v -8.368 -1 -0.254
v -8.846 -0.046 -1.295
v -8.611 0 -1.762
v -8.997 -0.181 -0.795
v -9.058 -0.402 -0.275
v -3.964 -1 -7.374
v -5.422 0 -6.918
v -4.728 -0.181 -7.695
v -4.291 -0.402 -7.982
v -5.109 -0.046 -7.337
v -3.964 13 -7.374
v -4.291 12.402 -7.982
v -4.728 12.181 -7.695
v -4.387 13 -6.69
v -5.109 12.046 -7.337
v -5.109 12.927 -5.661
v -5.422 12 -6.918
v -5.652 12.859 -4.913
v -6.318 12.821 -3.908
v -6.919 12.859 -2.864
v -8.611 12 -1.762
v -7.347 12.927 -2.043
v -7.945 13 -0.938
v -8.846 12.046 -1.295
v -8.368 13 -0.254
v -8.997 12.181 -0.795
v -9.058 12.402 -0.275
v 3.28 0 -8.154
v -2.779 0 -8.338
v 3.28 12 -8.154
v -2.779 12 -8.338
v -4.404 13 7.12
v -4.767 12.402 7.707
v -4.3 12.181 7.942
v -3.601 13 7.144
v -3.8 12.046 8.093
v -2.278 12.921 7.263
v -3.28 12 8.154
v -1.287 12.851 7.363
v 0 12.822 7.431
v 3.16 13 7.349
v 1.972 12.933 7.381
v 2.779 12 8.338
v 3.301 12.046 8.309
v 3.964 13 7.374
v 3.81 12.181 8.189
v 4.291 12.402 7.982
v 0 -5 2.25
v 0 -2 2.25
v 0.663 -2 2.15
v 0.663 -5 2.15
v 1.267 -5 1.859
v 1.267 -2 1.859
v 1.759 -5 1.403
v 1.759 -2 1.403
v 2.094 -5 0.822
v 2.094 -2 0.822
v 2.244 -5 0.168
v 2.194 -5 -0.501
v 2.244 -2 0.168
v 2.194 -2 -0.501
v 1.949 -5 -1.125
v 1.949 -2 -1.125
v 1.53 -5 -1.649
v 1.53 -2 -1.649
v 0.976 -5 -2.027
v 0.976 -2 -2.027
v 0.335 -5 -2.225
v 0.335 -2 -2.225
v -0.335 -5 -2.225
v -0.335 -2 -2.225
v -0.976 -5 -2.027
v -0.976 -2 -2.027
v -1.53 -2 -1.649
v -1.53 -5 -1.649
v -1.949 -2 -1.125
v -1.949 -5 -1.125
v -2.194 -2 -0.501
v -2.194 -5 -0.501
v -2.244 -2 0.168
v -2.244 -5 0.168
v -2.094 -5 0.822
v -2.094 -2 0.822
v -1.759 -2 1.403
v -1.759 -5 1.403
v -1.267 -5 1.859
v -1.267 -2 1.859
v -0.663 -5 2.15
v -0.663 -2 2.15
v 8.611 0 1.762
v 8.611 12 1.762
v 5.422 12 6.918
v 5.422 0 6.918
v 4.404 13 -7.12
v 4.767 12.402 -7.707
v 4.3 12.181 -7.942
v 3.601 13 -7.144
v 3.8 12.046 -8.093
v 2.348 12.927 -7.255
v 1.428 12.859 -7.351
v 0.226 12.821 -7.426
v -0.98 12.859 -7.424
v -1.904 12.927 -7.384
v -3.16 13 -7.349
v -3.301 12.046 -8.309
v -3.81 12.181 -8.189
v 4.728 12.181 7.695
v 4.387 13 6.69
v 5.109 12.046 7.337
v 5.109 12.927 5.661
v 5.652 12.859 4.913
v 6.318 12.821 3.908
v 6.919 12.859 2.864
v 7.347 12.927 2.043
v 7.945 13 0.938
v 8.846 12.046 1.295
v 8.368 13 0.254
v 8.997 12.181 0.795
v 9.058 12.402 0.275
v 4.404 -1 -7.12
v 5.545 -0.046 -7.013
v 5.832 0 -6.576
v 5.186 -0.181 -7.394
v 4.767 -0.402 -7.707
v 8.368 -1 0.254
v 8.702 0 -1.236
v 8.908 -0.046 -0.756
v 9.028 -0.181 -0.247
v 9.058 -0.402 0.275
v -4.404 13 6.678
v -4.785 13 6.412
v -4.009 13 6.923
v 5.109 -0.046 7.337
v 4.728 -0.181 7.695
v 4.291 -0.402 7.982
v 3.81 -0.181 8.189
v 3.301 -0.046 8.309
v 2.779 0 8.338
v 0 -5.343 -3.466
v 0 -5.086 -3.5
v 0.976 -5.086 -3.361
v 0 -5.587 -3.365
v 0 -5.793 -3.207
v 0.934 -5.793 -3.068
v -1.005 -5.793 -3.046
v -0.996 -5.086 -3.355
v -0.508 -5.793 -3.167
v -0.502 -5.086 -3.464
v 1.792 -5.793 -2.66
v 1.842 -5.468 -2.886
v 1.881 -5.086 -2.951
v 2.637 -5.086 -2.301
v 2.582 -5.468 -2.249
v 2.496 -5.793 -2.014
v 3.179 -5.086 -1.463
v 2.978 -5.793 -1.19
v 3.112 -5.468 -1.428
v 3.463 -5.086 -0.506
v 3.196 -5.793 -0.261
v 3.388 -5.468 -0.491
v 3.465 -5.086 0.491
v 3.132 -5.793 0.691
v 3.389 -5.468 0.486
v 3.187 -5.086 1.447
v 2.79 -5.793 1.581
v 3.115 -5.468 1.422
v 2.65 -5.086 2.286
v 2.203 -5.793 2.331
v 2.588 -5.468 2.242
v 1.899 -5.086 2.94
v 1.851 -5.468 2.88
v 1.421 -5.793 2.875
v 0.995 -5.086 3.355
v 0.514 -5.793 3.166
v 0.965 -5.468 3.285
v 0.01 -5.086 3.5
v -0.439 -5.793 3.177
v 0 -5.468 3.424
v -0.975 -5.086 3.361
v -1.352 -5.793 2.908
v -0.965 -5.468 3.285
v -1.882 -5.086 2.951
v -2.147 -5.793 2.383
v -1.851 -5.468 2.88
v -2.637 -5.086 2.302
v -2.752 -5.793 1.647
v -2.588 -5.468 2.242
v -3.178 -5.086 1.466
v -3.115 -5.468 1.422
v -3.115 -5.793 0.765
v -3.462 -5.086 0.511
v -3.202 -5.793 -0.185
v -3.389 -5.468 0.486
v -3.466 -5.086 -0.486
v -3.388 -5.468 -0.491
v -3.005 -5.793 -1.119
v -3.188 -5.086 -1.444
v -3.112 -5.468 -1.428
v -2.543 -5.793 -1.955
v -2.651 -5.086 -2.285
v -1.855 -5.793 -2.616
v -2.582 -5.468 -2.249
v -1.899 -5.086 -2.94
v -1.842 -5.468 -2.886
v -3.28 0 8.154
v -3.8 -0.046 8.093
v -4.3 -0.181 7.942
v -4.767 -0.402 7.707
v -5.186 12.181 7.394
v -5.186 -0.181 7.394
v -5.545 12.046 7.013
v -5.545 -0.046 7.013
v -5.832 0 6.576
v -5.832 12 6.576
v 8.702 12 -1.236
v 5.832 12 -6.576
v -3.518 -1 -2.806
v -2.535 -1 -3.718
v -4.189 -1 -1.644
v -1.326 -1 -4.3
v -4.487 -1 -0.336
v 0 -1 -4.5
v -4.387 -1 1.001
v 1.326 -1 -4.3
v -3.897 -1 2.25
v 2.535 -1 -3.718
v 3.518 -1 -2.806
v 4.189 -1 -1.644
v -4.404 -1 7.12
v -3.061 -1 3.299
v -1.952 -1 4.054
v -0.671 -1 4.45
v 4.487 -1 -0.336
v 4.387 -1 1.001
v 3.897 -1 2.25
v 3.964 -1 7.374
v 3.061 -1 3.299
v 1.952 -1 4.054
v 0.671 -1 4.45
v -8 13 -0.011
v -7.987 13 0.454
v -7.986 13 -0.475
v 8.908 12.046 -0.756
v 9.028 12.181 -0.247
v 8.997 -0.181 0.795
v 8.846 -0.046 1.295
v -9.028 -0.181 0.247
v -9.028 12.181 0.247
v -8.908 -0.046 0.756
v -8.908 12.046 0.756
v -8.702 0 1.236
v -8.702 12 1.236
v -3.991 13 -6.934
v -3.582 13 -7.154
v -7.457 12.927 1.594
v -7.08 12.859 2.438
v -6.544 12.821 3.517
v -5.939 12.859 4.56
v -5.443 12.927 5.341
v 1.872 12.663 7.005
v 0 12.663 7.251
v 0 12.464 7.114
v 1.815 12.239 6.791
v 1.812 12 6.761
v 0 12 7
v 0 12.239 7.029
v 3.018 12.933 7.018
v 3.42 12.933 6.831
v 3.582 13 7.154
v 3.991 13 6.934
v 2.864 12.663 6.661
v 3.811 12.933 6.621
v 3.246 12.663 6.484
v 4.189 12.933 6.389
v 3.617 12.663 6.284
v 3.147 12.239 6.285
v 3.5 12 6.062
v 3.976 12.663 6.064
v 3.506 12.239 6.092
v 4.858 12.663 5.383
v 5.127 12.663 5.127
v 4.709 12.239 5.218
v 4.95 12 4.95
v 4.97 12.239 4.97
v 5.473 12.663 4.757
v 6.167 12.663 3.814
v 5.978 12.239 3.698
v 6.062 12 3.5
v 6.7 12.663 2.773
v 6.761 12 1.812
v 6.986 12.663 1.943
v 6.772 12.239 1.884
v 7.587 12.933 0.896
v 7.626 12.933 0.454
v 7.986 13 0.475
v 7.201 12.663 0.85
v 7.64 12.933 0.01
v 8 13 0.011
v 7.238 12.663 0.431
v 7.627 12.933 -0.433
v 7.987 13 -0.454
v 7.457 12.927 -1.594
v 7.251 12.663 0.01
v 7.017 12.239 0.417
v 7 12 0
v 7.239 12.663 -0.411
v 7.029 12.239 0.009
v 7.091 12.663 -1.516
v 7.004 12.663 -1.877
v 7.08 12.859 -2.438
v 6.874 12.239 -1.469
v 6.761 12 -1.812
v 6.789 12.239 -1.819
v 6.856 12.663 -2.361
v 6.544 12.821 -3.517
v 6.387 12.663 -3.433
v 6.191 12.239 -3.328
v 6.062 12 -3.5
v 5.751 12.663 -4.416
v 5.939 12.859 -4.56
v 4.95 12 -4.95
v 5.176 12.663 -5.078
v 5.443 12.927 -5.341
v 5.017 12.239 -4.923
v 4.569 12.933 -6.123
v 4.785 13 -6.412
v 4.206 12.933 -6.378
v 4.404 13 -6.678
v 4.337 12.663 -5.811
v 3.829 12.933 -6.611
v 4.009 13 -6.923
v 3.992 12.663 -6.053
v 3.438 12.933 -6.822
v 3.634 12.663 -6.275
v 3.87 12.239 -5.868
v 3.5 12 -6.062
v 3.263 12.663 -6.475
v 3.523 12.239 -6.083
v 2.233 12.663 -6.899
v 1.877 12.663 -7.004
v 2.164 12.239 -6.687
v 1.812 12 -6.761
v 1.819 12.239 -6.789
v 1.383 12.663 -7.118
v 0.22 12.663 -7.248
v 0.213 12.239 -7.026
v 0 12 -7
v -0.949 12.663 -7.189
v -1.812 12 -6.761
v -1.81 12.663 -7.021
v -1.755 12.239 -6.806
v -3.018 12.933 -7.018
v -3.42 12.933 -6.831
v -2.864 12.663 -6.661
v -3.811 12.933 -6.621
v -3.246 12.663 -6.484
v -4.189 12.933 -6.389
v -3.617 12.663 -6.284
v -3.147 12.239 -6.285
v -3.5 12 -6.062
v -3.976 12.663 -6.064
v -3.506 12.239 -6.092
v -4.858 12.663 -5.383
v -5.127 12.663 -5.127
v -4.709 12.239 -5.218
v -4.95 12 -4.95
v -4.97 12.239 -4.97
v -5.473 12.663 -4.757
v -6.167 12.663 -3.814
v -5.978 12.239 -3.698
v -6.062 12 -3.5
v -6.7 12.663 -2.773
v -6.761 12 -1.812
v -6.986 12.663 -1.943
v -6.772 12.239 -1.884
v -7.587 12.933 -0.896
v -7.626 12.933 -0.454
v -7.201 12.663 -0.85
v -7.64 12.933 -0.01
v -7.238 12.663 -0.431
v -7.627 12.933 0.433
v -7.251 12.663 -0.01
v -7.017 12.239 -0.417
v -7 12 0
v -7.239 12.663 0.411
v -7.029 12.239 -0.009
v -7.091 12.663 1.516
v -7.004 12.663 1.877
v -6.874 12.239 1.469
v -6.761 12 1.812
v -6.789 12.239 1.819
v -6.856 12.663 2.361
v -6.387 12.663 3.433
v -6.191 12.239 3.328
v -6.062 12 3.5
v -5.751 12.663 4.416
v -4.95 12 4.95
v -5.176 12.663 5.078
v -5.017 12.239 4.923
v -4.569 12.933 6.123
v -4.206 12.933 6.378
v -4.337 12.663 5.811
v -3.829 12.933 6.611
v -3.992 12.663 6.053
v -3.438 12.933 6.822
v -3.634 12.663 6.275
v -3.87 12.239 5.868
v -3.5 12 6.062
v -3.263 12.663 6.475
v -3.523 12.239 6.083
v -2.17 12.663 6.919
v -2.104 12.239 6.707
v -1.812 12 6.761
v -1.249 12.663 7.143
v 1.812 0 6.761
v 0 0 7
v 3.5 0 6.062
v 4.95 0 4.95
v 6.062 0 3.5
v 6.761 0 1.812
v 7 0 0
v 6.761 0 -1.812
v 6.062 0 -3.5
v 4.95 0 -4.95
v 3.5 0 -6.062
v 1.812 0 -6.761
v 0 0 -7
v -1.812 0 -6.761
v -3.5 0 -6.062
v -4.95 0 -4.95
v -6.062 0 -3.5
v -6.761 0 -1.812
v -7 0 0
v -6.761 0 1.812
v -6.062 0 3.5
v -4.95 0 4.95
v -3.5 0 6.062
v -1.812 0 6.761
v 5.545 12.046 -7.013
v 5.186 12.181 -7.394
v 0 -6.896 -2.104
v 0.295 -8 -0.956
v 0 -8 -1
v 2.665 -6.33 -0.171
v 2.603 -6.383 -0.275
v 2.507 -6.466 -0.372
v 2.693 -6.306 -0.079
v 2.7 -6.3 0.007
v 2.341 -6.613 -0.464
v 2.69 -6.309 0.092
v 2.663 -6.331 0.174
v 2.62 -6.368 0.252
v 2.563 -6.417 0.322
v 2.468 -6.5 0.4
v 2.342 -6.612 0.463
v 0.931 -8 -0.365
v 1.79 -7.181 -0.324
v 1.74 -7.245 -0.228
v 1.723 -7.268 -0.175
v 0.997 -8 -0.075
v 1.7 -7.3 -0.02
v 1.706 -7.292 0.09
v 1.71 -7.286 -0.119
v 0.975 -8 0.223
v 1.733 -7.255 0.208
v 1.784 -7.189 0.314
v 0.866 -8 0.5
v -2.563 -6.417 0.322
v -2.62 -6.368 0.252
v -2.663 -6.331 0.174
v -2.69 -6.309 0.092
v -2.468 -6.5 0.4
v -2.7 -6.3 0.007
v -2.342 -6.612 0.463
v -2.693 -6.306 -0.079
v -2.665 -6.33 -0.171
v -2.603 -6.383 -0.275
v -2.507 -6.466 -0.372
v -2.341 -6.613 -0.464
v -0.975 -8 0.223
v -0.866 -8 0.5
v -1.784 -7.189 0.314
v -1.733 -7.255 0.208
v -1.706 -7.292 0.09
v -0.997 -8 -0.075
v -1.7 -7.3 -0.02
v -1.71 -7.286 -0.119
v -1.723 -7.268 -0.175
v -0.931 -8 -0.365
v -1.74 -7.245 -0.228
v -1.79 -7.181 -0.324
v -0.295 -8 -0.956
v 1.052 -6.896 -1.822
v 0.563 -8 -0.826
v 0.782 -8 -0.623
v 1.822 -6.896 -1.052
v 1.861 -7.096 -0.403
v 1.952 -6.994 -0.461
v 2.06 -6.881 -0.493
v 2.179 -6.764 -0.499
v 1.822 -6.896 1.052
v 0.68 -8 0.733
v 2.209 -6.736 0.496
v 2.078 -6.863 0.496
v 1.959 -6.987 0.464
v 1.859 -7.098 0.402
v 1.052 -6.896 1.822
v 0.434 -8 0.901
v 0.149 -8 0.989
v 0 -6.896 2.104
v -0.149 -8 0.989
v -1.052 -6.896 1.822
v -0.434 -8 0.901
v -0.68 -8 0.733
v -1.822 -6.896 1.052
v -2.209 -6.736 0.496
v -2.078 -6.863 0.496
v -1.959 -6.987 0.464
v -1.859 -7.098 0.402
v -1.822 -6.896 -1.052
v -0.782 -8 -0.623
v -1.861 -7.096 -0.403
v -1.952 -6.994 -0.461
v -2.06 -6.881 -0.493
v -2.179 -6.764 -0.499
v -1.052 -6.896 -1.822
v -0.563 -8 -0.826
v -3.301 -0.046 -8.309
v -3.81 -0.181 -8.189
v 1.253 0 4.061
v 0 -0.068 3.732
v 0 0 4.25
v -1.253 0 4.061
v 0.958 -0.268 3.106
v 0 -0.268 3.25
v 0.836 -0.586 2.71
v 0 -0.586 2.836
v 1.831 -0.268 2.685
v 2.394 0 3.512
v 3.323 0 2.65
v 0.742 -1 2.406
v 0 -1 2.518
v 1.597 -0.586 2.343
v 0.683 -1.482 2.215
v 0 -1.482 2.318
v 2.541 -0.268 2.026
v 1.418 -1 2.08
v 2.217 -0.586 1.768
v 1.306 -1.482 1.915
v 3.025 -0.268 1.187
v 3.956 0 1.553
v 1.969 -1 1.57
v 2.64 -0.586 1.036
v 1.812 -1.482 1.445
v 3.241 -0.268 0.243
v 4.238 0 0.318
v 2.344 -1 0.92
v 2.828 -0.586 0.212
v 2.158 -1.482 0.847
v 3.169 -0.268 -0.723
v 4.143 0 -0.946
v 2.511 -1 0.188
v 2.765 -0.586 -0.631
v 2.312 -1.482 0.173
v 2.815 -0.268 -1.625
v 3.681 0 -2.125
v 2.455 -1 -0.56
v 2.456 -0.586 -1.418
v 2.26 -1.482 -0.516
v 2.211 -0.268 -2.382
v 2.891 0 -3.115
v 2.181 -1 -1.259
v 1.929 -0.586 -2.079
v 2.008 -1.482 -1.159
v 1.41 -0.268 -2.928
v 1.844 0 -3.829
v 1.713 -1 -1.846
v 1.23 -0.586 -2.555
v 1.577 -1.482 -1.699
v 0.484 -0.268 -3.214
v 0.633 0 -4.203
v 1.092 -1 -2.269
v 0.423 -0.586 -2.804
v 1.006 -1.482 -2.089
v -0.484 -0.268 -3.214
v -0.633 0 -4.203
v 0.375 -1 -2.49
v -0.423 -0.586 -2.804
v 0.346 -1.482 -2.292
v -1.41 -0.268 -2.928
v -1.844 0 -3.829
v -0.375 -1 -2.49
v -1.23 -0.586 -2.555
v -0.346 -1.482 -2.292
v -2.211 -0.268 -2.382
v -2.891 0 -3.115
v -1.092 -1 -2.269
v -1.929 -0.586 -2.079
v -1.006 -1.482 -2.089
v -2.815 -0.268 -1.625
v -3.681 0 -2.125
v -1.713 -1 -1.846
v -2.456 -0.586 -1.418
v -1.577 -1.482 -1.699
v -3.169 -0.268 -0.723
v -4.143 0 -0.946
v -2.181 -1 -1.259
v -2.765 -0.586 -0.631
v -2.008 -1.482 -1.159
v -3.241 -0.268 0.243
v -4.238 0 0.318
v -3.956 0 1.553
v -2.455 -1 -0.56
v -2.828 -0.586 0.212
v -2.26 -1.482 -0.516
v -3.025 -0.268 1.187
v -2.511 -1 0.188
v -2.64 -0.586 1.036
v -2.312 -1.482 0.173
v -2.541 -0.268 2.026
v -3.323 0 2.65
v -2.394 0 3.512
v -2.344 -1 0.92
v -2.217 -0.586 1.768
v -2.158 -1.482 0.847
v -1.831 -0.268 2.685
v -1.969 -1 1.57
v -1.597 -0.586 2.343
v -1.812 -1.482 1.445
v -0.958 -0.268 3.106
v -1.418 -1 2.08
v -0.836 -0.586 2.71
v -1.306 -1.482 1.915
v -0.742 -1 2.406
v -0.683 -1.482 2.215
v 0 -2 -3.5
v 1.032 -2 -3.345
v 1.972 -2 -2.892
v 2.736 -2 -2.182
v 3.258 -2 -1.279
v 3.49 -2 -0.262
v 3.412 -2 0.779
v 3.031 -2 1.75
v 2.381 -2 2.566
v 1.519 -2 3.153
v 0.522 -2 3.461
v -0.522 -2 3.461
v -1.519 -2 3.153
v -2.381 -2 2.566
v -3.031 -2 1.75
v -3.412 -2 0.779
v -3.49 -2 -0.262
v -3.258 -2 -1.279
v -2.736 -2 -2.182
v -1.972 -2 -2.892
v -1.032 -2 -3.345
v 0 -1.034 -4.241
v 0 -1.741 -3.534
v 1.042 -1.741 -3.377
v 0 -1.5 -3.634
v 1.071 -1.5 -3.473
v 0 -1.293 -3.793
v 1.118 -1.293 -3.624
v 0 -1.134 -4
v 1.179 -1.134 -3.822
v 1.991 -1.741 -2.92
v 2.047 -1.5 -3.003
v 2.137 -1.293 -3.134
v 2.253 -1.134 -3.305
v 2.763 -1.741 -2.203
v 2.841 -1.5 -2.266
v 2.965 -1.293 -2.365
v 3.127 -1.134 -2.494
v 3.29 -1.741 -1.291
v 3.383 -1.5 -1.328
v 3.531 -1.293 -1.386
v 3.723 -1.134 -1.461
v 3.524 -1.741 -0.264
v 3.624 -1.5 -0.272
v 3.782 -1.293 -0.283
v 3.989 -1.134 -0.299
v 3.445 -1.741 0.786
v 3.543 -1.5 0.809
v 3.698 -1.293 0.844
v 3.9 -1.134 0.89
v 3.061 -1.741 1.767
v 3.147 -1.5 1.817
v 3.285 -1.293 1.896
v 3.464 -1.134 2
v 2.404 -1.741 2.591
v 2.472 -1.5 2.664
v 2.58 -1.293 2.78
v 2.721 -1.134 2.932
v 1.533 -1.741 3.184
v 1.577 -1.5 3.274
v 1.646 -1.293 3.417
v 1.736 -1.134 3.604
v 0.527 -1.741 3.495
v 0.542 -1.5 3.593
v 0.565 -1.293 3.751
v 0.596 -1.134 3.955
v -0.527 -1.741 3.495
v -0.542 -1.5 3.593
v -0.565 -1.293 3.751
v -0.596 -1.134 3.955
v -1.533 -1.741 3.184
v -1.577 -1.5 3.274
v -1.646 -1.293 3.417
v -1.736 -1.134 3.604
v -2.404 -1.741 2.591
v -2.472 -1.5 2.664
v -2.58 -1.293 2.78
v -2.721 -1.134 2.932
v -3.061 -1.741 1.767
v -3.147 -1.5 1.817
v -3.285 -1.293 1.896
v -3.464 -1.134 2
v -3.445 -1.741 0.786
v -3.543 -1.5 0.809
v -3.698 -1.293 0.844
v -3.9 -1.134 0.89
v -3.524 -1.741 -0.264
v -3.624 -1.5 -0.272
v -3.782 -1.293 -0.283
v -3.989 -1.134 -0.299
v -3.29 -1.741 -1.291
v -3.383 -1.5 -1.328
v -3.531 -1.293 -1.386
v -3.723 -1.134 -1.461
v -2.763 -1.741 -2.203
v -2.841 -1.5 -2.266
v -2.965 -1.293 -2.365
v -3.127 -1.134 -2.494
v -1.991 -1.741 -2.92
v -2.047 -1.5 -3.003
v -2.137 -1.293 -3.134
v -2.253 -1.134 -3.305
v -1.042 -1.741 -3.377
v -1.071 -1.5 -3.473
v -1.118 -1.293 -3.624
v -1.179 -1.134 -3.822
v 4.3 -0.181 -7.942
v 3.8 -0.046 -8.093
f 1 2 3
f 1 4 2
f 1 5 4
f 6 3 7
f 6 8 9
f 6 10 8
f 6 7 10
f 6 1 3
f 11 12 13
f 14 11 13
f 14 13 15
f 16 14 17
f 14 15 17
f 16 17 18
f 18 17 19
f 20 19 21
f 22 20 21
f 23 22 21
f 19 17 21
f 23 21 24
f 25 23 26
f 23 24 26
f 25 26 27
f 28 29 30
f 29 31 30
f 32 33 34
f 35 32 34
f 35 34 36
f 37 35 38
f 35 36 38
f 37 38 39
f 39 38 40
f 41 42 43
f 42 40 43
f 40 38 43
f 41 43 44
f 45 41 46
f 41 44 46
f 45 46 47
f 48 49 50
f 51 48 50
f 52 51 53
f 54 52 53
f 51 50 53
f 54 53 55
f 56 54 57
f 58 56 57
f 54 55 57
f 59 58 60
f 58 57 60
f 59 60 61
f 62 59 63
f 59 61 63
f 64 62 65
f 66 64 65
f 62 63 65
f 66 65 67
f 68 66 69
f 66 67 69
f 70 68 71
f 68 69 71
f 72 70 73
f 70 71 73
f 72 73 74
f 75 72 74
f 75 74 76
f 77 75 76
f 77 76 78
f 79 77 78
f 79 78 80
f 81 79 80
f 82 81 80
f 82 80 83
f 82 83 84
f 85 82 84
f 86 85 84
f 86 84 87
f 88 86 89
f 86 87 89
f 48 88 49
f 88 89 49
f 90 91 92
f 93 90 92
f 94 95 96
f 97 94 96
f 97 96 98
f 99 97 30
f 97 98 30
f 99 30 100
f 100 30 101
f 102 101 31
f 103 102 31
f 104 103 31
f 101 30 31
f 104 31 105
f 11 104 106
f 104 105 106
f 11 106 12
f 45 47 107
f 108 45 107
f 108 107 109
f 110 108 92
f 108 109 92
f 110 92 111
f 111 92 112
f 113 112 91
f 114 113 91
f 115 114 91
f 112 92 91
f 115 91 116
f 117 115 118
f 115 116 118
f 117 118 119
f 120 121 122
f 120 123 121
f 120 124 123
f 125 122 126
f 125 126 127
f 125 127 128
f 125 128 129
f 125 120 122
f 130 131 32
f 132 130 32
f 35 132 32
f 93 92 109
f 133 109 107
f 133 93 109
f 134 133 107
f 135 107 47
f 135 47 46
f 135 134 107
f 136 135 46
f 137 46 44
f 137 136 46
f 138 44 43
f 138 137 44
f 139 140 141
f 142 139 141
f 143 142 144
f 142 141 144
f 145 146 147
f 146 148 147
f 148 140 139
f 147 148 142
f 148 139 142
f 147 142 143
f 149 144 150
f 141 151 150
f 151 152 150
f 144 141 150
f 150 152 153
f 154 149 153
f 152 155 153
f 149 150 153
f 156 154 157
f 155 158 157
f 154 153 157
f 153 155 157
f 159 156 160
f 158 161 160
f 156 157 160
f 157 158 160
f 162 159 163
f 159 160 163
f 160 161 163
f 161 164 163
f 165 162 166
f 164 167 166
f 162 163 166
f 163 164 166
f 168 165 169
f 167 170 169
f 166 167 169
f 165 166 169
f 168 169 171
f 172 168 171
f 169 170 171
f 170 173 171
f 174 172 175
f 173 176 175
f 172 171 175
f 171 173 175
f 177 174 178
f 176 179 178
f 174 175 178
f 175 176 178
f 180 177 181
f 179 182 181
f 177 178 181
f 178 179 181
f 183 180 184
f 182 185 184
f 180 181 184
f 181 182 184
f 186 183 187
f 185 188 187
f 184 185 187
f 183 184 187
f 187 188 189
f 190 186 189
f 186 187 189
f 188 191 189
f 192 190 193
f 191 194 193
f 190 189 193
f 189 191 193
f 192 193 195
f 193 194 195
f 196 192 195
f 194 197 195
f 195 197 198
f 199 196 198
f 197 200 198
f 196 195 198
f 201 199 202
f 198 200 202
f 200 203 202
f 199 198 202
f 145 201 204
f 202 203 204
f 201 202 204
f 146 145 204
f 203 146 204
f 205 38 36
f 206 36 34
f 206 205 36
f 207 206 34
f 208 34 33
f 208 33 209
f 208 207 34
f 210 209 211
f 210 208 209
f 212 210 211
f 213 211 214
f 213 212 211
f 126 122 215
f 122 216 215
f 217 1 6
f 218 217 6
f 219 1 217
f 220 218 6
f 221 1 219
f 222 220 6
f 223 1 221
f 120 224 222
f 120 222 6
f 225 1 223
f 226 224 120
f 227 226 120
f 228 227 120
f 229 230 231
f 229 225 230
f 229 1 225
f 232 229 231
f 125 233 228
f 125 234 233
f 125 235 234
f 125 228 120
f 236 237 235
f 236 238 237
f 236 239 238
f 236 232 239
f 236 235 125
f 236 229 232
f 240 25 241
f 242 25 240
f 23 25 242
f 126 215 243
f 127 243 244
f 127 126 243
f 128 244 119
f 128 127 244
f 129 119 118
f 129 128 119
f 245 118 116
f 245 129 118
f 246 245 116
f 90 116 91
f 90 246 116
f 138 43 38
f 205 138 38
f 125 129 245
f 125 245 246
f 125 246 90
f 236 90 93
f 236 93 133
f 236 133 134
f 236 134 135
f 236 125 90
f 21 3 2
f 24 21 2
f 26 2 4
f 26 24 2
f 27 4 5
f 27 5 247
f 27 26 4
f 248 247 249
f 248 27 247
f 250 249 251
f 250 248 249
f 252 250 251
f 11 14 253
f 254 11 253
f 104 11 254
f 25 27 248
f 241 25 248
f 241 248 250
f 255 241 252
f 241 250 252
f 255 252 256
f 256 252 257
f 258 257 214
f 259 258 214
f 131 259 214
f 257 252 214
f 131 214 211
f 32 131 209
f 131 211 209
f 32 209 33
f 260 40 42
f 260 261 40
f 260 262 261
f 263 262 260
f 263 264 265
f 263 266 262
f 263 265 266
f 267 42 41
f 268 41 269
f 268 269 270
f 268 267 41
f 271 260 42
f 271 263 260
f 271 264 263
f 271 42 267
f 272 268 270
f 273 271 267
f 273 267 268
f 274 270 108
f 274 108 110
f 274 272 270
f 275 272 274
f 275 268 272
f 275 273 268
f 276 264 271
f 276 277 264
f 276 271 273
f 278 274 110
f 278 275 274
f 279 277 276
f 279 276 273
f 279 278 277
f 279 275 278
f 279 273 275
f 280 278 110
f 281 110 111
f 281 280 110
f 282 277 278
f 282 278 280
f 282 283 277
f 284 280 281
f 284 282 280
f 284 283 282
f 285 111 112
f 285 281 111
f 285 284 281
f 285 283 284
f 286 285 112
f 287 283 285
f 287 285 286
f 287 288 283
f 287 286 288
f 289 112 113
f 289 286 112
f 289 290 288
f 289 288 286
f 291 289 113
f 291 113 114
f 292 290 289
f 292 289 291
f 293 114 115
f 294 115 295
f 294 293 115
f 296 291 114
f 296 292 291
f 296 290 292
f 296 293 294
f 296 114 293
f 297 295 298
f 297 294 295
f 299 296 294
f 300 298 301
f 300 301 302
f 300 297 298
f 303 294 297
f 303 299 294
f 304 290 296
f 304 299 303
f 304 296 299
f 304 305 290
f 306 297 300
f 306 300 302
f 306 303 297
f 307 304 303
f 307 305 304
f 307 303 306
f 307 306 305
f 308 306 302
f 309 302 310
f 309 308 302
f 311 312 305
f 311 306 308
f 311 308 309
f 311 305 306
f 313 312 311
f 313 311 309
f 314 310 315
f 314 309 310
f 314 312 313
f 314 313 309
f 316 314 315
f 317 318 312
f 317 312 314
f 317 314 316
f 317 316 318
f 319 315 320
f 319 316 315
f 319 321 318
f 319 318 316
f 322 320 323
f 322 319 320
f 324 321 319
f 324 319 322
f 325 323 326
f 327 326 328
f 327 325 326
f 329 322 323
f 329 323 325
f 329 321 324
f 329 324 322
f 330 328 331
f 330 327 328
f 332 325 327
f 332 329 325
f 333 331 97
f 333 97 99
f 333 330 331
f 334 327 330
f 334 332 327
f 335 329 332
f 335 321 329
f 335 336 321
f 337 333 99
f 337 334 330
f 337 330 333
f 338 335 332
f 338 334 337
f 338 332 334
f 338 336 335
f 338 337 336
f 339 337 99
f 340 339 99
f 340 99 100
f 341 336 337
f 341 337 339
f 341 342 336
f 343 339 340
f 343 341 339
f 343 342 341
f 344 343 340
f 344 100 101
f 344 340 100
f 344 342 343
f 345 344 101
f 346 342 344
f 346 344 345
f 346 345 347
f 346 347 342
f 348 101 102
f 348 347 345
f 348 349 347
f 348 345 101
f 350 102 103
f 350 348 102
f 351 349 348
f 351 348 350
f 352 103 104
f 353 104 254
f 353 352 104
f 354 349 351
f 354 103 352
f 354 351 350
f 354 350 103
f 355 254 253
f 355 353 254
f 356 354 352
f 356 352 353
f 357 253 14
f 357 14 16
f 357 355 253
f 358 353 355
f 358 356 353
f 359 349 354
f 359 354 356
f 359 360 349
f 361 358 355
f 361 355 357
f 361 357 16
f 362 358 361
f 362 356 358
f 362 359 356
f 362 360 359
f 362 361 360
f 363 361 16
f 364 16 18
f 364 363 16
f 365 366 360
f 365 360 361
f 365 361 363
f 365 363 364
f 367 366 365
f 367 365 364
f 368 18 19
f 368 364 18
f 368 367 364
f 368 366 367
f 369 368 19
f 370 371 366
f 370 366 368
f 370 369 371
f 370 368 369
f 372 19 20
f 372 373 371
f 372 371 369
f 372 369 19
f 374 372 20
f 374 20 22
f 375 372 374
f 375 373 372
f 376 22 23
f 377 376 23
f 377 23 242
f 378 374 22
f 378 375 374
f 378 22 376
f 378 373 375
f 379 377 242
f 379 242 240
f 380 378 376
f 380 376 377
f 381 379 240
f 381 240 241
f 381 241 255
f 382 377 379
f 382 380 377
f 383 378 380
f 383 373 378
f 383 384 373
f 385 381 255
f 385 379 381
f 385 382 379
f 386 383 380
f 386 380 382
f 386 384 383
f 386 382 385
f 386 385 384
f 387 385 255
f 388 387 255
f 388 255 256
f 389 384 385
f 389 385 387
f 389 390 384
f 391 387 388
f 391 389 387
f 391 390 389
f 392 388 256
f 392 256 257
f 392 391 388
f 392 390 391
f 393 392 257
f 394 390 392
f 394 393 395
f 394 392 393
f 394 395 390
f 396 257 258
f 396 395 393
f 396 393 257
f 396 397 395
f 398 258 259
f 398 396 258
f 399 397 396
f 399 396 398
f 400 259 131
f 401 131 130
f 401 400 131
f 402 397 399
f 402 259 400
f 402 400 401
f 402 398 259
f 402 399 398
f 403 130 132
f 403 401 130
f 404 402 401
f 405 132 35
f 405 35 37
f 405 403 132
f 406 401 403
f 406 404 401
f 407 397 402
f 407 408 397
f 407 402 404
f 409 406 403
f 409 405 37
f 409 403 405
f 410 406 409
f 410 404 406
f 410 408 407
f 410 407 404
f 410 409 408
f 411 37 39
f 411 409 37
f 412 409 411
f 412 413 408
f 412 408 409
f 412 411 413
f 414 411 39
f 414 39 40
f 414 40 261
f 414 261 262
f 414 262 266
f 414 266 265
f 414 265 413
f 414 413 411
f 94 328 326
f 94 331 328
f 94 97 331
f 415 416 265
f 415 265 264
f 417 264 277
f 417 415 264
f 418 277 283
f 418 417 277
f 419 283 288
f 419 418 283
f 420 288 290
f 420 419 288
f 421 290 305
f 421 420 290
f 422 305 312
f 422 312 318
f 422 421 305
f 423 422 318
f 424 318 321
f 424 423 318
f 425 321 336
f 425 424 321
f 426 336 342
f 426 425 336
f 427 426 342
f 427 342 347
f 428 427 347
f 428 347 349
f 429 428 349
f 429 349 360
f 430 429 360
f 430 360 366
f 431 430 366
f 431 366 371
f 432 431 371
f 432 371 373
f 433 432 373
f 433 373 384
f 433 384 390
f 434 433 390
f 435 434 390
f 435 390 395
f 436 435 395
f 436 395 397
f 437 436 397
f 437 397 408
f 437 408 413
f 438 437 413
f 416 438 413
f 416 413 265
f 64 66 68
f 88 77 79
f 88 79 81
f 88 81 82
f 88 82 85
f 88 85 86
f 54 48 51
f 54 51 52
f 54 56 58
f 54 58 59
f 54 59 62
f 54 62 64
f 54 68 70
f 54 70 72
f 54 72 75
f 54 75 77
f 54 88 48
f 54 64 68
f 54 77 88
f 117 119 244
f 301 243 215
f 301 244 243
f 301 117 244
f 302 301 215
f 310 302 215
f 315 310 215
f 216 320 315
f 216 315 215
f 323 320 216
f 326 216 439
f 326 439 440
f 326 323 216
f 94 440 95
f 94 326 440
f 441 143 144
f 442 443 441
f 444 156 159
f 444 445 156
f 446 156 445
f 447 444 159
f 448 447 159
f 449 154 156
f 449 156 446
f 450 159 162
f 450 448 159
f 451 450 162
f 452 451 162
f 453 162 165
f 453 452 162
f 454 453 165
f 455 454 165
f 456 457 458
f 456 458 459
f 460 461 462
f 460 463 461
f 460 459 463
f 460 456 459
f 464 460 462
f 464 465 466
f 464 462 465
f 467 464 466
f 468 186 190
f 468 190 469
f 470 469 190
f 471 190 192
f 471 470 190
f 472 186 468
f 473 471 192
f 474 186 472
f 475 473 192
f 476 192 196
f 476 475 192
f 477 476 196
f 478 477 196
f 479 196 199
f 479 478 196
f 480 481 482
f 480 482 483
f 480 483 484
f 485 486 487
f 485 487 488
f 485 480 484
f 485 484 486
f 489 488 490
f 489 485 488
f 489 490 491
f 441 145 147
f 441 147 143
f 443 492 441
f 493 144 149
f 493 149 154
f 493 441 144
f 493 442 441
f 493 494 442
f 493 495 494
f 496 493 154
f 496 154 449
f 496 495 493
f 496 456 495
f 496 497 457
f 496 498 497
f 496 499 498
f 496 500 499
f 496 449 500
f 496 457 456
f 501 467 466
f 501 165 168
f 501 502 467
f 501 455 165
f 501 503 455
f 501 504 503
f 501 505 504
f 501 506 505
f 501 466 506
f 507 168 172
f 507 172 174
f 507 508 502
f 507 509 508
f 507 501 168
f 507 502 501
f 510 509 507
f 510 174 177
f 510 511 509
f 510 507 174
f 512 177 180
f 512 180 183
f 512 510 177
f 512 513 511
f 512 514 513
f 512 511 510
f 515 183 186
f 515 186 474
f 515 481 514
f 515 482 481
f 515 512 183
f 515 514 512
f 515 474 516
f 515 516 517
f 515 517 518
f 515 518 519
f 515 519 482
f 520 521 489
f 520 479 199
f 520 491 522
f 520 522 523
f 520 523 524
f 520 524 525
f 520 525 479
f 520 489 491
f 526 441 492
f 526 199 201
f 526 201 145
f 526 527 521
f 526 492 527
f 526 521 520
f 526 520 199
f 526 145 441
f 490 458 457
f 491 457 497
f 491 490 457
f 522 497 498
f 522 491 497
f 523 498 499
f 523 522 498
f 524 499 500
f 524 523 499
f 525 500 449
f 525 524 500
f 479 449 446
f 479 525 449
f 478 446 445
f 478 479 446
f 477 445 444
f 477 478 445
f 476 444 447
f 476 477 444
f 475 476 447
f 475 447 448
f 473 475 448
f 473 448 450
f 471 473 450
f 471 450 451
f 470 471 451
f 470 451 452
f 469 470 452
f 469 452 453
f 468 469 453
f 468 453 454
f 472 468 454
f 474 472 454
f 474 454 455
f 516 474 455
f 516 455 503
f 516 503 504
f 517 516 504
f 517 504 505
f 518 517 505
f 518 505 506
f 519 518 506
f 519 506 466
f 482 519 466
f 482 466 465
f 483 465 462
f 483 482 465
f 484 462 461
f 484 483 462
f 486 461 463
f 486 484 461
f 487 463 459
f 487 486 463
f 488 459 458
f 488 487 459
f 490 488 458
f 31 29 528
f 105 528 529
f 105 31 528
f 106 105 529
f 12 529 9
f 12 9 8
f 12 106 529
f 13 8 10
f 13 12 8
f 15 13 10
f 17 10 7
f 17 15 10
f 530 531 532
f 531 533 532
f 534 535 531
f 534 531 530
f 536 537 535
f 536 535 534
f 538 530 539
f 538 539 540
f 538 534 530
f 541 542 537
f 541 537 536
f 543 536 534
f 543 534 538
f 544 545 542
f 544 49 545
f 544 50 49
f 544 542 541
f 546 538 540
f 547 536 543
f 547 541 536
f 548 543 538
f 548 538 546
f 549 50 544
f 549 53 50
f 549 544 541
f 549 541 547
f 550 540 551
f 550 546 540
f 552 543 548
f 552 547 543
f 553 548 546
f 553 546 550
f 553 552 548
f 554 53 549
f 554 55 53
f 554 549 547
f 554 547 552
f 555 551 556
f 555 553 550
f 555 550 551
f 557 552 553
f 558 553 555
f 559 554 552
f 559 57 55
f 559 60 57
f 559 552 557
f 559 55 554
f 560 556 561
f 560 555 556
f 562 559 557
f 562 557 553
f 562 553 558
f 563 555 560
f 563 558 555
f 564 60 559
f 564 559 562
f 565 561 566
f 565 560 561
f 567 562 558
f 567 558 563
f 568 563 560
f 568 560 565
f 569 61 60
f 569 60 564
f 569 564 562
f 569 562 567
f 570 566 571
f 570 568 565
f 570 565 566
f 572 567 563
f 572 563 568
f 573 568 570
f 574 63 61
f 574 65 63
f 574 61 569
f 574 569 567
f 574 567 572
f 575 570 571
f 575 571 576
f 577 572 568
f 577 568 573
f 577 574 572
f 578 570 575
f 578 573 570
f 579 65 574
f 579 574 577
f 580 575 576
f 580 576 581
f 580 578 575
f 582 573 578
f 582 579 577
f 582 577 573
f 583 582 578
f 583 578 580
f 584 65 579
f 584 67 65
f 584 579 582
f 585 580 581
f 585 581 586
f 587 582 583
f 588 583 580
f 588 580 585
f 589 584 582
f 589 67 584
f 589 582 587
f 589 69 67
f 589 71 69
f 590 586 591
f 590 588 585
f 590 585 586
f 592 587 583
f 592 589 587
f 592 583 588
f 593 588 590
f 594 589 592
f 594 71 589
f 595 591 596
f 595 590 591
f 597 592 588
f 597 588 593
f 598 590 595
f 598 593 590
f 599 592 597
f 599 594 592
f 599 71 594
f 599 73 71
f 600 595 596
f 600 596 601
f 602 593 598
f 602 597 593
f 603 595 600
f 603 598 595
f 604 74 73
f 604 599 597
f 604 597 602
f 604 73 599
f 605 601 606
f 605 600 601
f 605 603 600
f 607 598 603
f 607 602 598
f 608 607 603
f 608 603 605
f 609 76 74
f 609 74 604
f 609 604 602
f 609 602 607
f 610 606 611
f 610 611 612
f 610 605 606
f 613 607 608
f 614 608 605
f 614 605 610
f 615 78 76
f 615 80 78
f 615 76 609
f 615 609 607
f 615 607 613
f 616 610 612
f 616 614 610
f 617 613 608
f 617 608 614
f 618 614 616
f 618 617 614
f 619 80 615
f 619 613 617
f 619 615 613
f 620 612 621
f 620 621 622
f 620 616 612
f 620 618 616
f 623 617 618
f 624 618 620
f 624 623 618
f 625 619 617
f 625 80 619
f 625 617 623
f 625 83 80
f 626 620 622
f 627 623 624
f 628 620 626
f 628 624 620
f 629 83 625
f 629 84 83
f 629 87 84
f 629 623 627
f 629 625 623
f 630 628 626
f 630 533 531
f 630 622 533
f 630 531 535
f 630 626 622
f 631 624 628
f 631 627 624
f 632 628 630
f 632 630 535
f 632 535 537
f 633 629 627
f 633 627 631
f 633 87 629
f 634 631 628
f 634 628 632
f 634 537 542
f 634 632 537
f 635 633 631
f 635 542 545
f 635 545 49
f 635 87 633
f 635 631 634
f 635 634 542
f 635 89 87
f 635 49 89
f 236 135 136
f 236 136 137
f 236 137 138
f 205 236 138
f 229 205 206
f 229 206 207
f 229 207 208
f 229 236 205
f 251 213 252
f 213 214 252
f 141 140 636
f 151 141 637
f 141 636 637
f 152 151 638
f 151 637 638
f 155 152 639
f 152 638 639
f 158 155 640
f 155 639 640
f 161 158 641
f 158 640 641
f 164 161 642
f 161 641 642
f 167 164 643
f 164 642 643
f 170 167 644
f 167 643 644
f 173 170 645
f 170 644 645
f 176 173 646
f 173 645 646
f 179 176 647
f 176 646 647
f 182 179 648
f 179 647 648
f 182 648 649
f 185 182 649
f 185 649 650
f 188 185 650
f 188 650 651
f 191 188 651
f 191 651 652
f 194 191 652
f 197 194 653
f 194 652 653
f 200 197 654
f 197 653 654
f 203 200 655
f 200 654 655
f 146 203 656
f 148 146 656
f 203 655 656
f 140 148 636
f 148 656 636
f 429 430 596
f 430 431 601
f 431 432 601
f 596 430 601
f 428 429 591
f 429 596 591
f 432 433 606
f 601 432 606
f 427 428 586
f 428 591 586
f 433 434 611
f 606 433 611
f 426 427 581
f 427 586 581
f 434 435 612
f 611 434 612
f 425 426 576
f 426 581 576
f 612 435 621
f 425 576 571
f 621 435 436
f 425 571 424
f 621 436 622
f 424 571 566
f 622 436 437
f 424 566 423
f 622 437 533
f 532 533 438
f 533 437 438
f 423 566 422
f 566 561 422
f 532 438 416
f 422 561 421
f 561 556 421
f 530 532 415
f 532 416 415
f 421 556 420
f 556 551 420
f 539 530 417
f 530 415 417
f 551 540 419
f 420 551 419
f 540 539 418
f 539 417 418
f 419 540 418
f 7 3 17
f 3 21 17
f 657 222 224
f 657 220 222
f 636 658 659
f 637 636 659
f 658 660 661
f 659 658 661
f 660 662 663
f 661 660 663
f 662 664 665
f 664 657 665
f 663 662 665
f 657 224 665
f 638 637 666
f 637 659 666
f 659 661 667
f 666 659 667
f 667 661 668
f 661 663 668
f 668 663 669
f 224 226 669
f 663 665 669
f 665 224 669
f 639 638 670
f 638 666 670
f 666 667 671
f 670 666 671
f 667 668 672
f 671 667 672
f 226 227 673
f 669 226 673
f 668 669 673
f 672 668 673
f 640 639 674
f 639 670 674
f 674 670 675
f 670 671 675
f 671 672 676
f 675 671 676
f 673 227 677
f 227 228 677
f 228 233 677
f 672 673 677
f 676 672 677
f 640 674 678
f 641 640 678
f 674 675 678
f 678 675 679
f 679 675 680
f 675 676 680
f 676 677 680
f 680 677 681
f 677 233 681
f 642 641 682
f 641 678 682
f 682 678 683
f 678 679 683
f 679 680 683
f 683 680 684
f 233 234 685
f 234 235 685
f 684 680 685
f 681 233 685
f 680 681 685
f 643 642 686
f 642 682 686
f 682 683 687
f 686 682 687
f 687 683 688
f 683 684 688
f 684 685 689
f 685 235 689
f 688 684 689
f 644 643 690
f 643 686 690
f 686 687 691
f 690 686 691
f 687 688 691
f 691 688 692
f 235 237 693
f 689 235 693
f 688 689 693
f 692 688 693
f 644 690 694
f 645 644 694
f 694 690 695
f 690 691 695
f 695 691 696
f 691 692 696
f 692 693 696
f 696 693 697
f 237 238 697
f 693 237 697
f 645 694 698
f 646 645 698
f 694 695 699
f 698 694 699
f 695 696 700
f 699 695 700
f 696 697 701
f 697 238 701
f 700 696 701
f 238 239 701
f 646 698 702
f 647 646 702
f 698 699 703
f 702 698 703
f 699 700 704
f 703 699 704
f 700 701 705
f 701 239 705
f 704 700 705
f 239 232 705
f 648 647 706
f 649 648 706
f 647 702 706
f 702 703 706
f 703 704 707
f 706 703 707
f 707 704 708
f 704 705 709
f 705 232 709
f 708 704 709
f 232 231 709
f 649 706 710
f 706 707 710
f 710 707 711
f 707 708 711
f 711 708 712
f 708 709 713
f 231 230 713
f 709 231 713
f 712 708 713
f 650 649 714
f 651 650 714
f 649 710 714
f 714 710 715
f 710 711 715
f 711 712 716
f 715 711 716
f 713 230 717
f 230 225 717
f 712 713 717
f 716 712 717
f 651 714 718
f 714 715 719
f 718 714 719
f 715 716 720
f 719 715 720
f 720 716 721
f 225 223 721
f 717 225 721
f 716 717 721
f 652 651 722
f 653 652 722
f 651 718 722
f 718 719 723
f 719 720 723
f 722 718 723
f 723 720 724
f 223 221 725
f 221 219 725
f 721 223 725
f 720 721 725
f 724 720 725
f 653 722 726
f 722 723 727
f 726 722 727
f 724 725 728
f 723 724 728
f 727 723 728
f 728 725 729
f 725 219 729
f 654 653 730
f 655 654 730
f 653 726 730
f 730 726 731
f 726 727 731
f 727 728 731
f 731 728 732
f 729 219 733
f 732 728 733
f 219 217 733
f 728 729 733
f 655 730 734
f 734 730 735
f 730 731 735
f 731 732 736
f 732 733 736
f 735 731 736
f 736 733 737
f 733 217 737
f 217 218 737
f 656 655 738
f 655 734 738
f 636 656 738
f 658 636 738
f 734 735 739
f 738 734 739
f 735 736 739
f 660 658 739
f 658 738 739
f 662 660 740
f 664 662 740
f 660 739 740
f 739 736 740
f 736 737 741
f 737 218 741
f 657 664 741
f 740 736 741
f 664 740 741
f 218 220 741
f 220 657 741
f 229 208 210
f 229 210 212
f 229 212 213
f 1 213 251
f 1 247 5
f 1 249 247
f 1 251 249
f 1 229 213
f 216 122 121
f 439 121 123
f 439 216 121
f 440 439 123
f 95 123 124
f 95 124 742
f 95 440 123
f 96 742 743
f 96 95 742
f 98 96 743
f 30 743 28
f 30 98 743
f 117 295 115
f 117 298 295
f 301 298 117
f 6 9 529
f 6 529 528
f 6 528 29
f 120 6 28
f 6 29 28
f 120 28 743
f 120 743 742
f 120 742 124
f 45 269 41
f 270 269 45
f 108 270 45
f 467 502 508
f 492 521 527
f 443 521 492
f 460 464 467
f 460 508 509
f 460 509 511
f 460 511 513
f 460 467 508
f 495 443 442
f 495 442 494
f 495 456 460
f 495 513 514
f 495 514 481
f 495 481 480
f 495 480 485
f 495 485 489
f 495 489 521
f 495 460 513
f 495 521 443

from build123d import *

# Parameters (mm, degrees)
ESQUISSE1_R                  = 0.7
BOSS_EXTRU_1_DEPTH           = 1.3
BOSS_EXTRU_2_DEPTH           = 0.1
CHANFREIN1_SIZE              = 0.1
CONG_1_R                     = 0.3
ESQUISSE3_R                  = 0.35
BOSS_EXTRU_3_DEPTH           = 0.7
CHANFREIN2_SIZE              = 0.25
CONG_2_R                     = 0.1
CONG_3_R                     = 0.1
ENL_V_MAT_EXTRU_1_DEPTH      = 0.7
ENL_V_MAT_EXTRU_1_DEPTH_BACK = 0.7
ESQUISSE4_R                  = 0.05
CONG_4_R                     = 0.1
ESQUISSE5_R                  = 0.225
ENL_V_MAT_EXTRU_2_DEPTH      = 0.5
CONG_5_R                     = 0.2
ECHELLE1_SCALE               = 10


with BuildPart() as part:
    # Esquisse1 → Boss.-Extru.1 (new body)
    with BuildSketch(Plane(origin=(0, 0, 0), x_dir=(1, 0, 0), z_dir=(0, 1, 0))):
        Polygon((0.501147742, 0.810154887), (-0.451040842, 0.839084119), (-0.952188584, 0.028929232), (-0.501147742, -0.810154887), (0.451040842, -0.839084119), (0.952188584, -0.028929232), align=None)
        with Locations(Location((0, 0, 0), (0, 0, 270))):
            Circle(ESQUISSE1_R, mode=Mode.SUBTRACT)
    extrude(amount=BOSS_EXTRU_1_DEPTH)

    # Esquisse2 → Boss.-Extru.2 (add)
    with BuildSketch(Plane.XZ):
        Polygon((0.501147742, -0.810154887), (0.952188584, 0.028929232), (0.451040842, 0.839084119), (-0.501147742, 0.810154887), (-0.952188584, -0.028929232), (-0.451040842, -0.839084119), align=None)
    extrude(amount=BOSS_EXTRU_2_DEPTH)

    # Chanfrein1
    chanfrein1_edges = [part.edges().sort_by_distance(p)[0] for p in [
        (-0.701614713, 1.3, -0.434006676),
        (-0.726668163, 1.3, 0.390612827),
        (-0.02505345, 1.3, 0.824619503),
        (0.701614713, 1.3, 0.434006676),
        (0.02505345, -0.1, -0.824619503),
        (0.726668163, -0.1, -0.390612827),
        (0.701614713, -0.1, 0.434006676),
        (-0.02505345, -0.1, 0.824619503),
        (-0.726668163, -0.1, 0.390612827),
        (-0.701614713, -0.1, -0.434006676),
        (0.726668163, 1.3, -0.390612827),
        (0.02505345, 1.3, -0.824619503),
    ]]
    chamfer(chanfrein1_edges, length=CHANFREIN1_SIZE)

    # Congé1
    cong_1_edges = [part.edges().sort_by_distance(p)[0] for p in [
        (0.501147742, 0.6, -0.810154887),
        (-0.451040842, 0.6, -0.839084119),
        (0.952188584, 0.6, 0.028929232),
        (0.451040842, 0.6, 0.839084119),
        (-0.501147742, 0.6, 0.810154887),
        (-0.952188584, 0.6, -0.028929232),
    ]]
    fillet(cong_1_edges, radius=CONG_1_R)

    # Esquisse3 → Boss.-Extru.3 (add)
    with BuildSketch(Plane(origin=(0, -0.1, 0), x_dir=(-1, 0, 0), z_dir=(0, -1, 0))):
        with Locations(Location((0, 0, 0), (0, 0, 90))):
            Circle(ESQUISSE3_R)
    extrude(amount=BOSS_EXTRU_3_DEPTH)

    # Chanfrein2
    chanfrein2_edges = [part.edges().sort_by_distance(p)[0] for p in [
        (0, -0.8, 0.35),
    ]]
    chamfer(chanfrein2_edges, length=CHANFREIN2_SIZE)

    # Congé2
    # the kernel refuses this fillet: 0.1 mm, written as the material it takes off along each edge
    with BuildSketch(Plane(origin=(0, 1.3, 0), x_dir=(0, 0, 1), z_dir=(-1, 0, 0))) as cong_2_piece_1:
        with BuildLine():
            CenterArc((0.7 + CONG_2_R, -CONG_2_R), CONG_2_R, 90, 90)
            Line((0.7, -CONG_2_R), (0.7, 0))
            Line((0.7, 0), (0.7 + CONG_2_R, 0))
        make_face()
    revolve(axis=Axis((0, 1.3, 0), (0, 1, 0)), mode=Mode.SUBTRACT)

    # Congé3
    cong_3_edges = [part.edges().sort_by_distance(p)[0] for p in [
        (0, -0.1, 0.35),
    ]]
    fillet(cong_3_edges, radius=CONG_3_R)

    # Esquisse4 → Enlèv. mat.-Extru.1 (cut, two sides: drawn at the far end of the back side and taken through both)
    with BuildSketch(Plane(origin=(0, 0, 0), x_dir=(0, 0, -1), z_dir=(1, 0, 0)).offset(-ENL_V_MAT_EXTRU_1_DEPTH_BACK)):
        with Locations(Location((0, -0.68, 0), (0, 0, 297.173904779))):
            Circle(ESQUISSE4_R)
    extrude(amount=ENL_V_MAT_EXTRU_1_DEPTH + ENL_V_MAT_EXTRU_1_DEPTH_BACK, mode=Mode.SUBTRACT)

    # Congé4
    cong_4_edges = [part.edges().sort_by_distance(p)[0] for p in [
        (0, -0.55, 0.35),
    ]]
    fillet(cong_4_edges, radius=CONG_4_R)

    # Esquisse5 → Enlèv. mat.-Extru.2 (cut)
    with BuildSketch(Plane(origin=(0, 0, 0), x_dir=(1, 0, 0), z_dir=(0, 1, 0))):
        with Locations(Location((0, 0, 0), (0, 0, 270))):
            Circle(ESQUISSE5_R)
    extrude(amount=-ENL_V_MAT_EXTRU_2_DEPTH, mode=Mode.SUBTRACT)

    # Congé5
    cong_5_edges = [part.edges().sort_by_distance(p)[0] for p in [
        (0, 0, -0.225),
    ]]
    fillet(cong_5_edges, radius=CONG_5_R)


with BuildPart() as part_1:
    # Echelle1: scaled about (0, 0, 0)
    add(part.part.scale(ECHELLE1_SCALE))


solid = part_1.part
